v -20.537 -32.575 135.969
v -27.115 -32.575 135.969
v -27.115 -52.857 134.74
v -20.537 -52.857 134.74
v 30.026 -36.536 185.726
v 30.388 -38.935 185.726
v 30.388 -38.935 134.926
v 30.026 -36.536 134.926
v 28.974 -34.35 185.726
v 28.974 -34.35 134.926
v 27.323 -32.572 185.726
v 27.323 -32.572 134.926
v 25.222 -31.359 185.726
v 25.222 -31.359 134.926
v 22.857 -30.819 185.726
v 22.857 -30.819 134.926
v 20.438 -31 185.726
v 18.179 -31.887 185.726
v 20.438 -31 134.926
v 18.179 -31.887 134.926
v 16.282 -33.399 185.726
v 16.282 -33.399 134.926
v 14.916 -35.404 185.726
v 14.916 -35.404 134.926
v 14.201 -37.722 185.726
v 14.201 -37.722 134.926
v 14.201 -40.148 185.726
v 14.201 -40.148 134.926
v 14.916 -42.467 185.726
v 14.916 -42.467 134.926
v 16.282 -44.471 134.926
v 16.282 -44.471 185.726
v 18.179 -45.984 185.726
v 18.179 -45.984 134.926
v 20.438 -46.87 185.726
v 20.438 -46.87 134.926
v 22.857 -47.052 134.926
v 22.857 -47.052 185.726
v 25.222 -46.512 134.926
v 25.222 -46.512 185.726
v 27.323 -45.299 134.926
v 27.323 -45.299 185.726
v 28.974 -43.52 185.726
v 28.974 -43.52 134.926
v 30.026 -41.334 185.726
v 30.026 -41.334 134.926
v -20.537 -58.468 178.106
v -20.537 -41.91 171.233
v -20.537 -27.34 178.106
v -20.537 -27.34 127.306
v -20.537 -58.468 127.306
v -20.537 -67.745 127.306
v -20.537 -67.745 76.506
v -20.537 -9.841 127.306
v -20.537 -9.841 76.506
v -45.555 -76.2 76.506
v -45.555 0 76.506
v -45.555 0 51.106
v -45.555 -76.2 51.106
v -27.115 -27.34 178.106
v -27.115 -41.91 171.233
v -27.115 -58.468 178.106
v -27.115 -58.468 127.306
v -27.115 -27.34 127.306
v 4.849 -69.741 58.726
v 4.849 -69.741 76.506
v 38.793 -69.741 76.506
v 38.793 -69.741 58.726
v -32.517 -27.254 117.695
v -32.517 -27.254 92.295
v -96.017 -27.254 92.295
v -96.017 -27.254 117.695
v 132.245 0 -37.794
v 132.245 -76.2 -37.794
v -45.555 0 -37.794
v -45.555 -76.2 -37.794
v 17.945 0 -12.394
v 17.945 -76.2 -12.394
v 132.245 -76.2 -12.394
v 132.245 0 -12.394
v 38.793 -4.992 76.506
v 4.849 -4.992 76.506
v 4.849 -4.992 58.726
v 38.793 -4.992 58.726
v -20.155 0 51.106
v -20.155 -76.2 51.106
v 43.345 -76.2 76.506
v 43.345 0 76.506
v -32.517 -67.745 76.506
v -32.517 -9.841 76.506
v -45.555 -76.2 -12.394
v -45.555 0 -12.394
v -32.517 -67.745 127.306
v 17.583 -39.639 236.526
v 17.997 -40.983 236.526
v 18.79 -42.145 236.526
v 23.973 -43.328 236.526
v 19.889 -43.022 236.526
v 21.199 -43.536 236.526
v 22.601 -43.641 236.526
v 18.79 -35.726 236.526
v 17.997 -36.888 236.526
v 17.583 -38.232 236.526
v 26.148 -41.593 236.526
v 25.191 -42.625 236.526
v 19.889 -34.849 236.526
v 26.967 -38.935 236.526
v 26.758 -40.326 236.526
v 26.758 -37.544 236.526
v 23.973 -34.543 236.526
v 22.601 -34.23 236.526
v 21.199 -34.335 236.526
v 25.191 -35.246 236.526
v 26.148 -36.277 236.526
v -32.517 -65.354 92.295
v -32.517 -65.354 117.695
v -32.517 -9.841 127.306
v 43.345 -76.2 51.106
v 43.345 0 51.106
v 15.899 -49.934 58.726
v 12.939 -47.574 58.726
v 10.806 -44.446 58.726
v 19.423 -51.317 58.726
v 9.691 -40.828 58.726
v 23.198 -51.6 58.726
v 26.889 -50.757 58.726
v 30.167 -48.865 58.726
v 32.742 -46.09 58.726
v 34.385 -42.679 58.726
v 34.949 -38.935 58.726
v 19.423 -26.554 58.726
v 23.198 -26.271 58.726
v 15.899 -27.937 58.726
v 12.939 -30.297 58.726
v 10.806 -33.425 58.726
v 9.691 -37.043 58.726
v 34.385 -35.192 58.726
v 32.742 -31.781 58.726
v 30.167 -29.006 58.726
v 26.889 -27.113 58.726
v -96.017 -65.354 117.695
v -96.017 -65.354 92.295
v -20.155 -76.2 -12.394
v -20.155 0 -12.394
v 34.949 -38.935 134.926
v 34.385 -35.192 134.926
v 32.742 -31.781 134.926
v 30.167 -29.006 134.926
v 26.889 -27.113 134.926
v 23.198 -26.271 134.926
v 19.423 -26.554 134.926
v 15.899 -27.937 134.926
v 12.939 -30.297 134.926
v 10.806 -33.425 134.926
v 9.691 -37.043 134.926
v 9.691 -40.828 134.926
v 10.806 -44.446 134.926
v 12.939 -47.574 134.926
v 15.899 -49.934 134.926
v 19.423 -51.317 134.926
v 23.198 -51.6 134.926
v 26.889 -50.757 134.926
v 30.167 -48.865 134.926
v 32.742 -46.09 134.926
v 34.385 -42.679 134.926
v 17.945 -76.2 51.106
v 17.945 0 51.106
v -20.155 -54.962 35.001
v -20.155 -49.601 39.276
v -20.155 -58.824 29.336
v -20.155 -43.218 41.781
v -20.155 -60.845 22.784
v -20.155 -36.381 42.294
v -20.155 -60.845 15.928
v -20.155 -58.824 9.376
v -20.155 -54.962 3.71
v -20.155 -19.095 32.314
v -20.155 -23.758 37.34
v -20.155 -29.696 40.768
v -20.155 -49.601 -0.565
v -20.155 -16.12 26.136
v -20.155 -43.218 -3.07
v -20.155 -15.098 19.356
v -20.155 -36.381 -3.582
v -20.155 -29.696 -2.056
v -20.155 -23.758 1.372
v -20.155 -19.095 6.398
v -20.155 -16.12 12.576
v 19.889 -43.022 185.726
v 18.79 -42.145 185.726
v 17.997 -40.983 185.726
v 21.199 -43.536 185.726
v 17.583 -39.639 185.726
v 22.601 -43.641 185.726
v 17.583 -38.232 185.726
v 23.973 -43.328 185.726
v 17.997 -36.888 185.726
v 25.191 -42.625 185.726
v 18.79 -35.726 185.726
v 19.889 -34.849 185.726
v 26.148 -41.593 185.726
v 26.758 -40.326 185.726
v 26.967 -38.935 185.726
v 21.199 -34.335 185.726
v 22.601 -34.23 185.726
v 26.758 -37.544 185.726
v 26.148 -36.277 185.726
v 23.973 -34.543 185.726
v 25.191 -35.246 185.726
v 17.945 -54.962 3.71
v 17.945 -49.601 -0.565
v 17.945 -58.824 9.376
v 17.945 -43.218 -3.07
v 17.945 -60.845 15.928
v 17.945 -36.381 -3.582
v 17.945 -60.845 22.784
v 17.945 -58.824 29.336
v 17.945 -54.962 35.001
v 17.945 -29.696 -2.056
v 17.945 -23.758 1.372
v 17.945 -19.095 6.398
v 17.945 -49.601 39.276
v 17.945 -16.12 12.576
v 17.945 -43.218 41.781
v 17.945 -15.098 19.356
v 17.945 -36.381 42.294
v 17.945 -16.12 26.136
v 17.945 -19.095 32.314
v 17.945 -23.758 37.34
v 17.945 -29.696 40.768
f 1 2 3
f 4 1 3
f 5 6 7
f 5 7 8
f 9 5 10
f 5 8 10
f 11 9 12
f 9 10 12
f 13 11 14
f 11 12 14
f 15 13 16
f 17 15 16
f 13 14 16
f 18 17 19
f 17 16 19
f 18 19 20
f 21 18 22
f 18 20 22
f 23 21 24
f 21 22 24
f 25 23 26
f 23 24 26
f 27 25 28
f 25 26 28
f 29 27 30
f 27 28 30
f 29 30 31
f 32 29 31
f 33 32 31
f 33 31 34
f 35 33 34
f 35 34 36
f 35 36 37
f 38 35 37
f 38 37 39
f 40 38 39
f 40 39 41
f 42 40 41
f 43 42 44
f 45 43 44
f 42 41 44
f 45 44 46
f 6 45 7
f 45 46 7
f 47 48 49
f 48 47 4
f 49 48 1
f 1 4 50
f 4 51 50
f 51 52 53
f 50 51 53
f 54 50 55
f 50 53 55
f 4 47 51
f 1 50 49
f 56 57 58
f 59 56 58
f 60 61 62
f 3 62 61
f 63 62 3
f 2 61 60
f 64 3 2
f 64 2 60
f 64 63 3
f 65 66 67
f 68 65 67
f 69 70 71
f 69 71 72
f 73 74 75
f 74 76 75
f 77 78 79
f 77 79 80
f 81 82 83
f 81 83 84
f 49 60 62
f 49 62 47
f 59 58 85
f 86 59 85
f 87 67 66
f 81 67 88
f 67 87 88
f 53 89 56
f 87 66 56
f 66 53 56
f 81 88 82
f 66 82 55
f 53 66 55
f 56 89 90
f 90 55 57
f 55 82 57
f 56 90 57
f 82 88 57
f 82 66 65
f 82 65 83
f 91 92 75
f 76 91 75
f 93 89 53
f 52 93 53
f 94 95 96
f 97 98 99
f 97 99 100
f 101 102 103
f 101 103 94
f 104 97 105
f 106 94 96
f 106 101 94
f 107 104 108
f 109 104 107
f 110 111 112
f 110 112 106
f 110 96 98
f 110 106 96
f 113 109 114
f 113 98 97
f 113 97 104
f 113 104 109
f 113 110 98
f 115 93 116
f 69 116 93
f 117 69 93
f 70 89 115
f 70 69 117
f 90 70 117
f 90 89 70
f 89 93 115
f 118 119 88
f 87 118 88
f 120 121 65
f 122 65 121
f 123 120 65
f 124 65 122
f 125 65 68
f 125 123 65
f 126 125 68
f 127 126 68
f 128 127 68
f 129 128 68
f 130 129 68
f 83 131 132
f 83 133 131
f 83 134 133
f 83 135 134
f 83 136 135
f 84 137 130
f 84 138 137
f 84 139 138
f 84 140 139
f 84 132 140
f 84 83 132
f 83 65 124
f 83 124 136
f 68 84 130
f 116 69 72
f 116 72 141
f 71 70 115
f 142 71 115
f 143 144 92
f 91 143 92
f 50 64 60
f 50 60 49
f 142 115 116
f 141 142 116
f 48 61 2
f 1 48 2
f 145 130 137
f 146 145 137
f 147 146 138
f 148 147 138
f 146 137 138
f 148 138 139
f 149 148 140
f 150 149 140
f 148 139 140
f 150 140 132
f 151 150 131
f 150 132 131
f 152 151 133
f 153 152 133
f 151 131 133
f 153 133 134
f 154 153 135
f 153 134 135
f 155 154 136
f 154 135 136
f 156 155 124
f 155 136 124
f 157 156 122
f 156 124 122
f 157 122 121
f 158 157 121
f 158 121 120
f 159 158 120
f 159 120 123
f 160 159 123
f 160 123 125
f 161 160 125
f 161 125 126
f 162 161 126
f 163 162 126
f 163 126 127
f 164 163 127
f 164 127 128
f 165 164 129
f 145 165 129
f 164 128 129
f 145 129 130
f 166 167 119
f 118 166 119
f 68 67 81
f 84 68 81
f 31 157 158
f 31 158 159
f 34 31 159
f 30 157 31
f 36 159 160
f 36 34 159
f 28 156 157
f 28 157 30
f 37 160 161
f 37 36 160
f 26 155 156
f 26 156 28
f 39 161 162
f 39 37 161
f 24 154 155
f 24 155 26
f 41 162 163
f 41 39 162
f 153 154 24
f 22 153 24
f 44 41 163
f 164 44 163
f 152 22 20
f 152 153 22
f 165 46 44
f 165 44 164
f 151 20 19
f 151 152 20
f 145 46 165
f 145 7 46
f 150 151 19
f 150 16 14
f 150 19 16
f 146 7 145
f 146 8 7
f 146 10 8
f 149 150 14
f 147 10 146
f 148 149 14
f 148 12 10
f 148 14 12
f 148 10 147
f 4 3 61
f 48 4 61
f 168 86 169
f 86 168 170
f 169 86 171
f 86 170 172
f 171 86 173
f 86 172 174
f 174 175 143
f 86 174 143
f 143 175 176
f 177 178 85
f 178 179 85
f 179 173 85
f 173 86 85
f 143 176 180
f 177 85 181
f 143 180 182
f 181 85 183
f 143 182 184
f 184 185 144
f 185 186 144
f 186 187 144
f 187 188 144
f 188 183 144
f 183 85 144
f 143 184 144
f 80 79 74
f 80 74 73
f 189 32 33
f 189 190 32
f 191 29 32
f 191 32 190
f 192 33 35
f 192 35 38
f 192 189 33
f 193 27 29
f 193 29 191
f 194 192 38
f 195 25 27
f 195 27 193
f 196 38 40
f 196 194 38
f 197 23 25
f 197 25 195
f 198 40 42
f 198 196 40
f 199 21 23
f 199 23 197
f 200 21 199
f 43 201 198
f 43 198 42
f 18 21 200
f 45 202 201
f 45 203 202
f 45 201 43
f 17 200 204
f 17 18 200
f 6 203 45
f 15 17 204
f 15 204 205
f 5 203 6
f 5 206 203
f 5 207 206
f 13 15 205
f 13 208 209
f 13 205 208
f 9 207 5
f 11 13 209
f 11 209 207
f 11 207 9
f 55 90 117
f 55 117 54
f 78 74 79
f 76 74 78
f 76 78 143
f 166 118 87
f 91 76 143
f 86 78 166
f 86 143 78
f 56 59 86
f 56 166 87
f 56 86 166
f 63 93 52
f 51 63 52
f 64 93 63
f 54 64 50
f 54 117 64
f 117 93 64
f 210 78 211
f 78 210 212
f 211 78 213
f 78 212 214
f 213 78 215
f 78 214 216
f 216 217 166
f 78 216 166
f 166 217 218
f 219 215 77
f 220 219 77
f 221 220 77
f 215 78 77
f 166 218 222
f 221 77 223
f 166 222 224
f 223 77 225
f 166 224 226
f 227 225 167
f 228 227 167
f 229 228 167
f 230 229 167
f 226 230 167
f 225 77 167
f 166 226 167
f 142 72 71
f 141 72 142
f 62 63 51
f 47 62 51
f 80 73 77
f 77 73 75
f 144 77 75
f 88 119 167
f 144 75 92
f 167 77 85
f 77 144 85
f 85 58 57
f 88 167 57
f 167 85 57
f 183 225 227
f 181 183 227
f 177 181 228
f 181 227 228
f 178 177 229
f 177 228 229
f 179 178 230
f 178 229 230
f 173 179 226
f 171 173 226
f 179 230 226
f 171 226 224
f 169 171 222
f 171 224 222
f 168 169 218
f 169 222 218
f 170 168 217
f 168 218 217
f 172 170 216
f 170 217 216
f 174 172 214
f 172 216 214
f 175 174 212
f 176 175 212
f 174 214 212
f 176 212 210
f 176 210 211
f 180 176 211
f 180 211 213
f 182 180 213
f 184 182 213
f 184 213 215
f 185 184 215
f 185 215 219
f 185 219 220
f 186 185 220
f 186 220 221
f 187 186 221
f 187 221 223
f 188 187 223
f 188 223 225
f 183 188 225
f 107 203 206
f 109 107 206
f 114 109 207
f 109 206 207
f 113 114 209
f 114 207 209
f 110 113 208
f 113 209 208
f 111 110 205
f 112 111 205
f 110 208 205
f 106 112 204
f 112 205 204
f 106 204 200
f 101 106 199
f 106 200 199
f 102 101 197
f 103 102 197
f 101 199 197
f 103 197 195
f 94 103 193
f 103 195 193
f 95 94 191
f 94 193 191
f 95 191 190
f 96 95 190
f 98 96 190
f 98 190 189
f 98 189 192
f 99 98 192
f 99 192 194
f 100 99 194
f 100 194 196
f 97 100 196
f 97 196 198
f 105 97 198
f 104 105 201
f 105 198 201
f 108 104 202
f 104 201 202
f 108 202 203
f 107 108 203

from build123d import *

# Parameters (mm, degrees)
F1_DEPTH  = 76.2
F2_R      = 23.0023216087
F3_DEPTH  = 63.501
F4_W      = 11.9801070541
F4_H      = 57.9038551077
F5_DEPTH  = 50.8
F6_W      = 33.9436382055
F6_H      = 64.7496273741
F7_DEPTH  = 17.78
F8_R      = 12.7
F9_DEPTH  = 76.2
F10_W     = 38.1
F10_H     = 25.4
F11_DEPTH = 63.5
F12_R     = 8.1391487304
F13_DEPTH = 50.8
F14_R     = 4.7187063419
F15_DEPTH = 50.8
F16_W     = 6.577372551
F16_H     = 31.1278868467
F17_DEPTH = 50.8
F19_DEPTH = 30.48
F20_W     = 76.2
F20_H     = 25.4
F21_DEPTH = 88.9


with BuildPart() as f1:
    # F0 (on Front) → F1 (new body)
    with BuildSketch(Plane.XZ):
        Polygon((-45.5546230793, -12.3941076807), (-45.5546230793, -37.7941076807), (43.3453769207, -37.7941076807), (43.3453769207, -12.3941076807), (17.9453769207, -12.3941076807), (17.9453769207, 51.1058923193), (43.3453769207, 51.1058923193), (43.3453769207, 76.5058923193), (-45.5546230793, 76.5058923193), (-45.5546230793, 51.1058923193), (-20.1546230793, 51.1058923193), (-20.1546230793, -12.3941076807), align=None)
    extrude(amount=F1_DEPTH)

    # F2 (on face) → F3 (cut, through all)
    with BuildSketch(Plane.YZ.offset(17.9453769207)):
        with Locations((-38.1, 19.3558923193)):
            Circle(F2_R)
    extrude(amount=-F3_DEPTH, mode=Mode.SUBTRACT)

    # F4 (on face) → F5 (join)
    with BuildSketch(Plane.XY.offset(76.5058923193)):
        with Locations((-26.5273796394, -38.7927298434)):
            Rectangle(F4_W, F4_H)
    extrude(amount=F5_DEPTH)

    # F6 (on face) → F7 (cut)
    with BuildSketch(Plane.XY.offset(76.5058923193)):
        with Locations((21.820910275, -37.3665248044)):
            Rectangle(F6_W, F6_H)
    extrude(amount=-F7_DEPTH, mode=Mode.SUBTRACT)

    # F8 (on face) → F9 (join)
    with BuildSketch(Plane.XY.offset(58.7258923193)):
        with Locations((22.248769179, -38.9353483915)):
            Circle(F8_R)
    extrude(amount=F9_DEPTH)

    # F10 (on face) → F11 (join)
    with BuildSketch(Plane(origin=(-32.5174331665, 0, 0), x_dir=(0, -1, 0), z_dir=(-1, 0, 0))):
        with Locations((46.303805925, 104.9945801497)):
            Rectangle(F10_W, F10_H)
    extrude(amount=F11_DEPTH)

    # F12 (on face) → F13 (join)
    with BuildSketch(Plane.XY.offset(134.9258923193)):
        with Locations((22.248769179, -38.9353483915)):
            Circle(F12_R)
    extrude(amount=F13_DEPTH)

    # F14 (on face) → F15 (join)
    with BuildSketch(Plane.XY.offset(185.7258923193)):
        with Locations((22.248769179, -38.9353483915)):
            Circle(F14_R)
    extrude(amount=F15_DEPTH)

    # F16 (on face) → F17 (join)
    with BuildSketch(Plane.XY.offset(127.3058923193)):
        with Locations((-23.8260123879, -42.9039588198)):
            Rectangle(F16_W, F16_H)
    extrude(amount=F17_DEPTH)

    # F18 (on face) → F19 (cut)
    with BuildSketch(Plane(origin=(-27.1146986634, 0, 0), x_dir=(0, -1, 0), z_dir=(-1, 0, 0))):
        Polygon((41.9095075075, 171.2333210797), (32.5746728326, 135.9694041327), (52.8574562847, 134.7401379139), align=None)
    extrude(amount=-F19_DEPTH, mode=Mode.SUBTRACT)

    # F20 (on face) → F21 (join)
    with BuildSketch(Plane.YZ.offset(43.3453769207)):
        with Locations((-38.1, -25.0941076807)):
            Rectangle(F20_W, F20_H)
    extrude(amount=F21_DEPTH)


solid = f1.part
